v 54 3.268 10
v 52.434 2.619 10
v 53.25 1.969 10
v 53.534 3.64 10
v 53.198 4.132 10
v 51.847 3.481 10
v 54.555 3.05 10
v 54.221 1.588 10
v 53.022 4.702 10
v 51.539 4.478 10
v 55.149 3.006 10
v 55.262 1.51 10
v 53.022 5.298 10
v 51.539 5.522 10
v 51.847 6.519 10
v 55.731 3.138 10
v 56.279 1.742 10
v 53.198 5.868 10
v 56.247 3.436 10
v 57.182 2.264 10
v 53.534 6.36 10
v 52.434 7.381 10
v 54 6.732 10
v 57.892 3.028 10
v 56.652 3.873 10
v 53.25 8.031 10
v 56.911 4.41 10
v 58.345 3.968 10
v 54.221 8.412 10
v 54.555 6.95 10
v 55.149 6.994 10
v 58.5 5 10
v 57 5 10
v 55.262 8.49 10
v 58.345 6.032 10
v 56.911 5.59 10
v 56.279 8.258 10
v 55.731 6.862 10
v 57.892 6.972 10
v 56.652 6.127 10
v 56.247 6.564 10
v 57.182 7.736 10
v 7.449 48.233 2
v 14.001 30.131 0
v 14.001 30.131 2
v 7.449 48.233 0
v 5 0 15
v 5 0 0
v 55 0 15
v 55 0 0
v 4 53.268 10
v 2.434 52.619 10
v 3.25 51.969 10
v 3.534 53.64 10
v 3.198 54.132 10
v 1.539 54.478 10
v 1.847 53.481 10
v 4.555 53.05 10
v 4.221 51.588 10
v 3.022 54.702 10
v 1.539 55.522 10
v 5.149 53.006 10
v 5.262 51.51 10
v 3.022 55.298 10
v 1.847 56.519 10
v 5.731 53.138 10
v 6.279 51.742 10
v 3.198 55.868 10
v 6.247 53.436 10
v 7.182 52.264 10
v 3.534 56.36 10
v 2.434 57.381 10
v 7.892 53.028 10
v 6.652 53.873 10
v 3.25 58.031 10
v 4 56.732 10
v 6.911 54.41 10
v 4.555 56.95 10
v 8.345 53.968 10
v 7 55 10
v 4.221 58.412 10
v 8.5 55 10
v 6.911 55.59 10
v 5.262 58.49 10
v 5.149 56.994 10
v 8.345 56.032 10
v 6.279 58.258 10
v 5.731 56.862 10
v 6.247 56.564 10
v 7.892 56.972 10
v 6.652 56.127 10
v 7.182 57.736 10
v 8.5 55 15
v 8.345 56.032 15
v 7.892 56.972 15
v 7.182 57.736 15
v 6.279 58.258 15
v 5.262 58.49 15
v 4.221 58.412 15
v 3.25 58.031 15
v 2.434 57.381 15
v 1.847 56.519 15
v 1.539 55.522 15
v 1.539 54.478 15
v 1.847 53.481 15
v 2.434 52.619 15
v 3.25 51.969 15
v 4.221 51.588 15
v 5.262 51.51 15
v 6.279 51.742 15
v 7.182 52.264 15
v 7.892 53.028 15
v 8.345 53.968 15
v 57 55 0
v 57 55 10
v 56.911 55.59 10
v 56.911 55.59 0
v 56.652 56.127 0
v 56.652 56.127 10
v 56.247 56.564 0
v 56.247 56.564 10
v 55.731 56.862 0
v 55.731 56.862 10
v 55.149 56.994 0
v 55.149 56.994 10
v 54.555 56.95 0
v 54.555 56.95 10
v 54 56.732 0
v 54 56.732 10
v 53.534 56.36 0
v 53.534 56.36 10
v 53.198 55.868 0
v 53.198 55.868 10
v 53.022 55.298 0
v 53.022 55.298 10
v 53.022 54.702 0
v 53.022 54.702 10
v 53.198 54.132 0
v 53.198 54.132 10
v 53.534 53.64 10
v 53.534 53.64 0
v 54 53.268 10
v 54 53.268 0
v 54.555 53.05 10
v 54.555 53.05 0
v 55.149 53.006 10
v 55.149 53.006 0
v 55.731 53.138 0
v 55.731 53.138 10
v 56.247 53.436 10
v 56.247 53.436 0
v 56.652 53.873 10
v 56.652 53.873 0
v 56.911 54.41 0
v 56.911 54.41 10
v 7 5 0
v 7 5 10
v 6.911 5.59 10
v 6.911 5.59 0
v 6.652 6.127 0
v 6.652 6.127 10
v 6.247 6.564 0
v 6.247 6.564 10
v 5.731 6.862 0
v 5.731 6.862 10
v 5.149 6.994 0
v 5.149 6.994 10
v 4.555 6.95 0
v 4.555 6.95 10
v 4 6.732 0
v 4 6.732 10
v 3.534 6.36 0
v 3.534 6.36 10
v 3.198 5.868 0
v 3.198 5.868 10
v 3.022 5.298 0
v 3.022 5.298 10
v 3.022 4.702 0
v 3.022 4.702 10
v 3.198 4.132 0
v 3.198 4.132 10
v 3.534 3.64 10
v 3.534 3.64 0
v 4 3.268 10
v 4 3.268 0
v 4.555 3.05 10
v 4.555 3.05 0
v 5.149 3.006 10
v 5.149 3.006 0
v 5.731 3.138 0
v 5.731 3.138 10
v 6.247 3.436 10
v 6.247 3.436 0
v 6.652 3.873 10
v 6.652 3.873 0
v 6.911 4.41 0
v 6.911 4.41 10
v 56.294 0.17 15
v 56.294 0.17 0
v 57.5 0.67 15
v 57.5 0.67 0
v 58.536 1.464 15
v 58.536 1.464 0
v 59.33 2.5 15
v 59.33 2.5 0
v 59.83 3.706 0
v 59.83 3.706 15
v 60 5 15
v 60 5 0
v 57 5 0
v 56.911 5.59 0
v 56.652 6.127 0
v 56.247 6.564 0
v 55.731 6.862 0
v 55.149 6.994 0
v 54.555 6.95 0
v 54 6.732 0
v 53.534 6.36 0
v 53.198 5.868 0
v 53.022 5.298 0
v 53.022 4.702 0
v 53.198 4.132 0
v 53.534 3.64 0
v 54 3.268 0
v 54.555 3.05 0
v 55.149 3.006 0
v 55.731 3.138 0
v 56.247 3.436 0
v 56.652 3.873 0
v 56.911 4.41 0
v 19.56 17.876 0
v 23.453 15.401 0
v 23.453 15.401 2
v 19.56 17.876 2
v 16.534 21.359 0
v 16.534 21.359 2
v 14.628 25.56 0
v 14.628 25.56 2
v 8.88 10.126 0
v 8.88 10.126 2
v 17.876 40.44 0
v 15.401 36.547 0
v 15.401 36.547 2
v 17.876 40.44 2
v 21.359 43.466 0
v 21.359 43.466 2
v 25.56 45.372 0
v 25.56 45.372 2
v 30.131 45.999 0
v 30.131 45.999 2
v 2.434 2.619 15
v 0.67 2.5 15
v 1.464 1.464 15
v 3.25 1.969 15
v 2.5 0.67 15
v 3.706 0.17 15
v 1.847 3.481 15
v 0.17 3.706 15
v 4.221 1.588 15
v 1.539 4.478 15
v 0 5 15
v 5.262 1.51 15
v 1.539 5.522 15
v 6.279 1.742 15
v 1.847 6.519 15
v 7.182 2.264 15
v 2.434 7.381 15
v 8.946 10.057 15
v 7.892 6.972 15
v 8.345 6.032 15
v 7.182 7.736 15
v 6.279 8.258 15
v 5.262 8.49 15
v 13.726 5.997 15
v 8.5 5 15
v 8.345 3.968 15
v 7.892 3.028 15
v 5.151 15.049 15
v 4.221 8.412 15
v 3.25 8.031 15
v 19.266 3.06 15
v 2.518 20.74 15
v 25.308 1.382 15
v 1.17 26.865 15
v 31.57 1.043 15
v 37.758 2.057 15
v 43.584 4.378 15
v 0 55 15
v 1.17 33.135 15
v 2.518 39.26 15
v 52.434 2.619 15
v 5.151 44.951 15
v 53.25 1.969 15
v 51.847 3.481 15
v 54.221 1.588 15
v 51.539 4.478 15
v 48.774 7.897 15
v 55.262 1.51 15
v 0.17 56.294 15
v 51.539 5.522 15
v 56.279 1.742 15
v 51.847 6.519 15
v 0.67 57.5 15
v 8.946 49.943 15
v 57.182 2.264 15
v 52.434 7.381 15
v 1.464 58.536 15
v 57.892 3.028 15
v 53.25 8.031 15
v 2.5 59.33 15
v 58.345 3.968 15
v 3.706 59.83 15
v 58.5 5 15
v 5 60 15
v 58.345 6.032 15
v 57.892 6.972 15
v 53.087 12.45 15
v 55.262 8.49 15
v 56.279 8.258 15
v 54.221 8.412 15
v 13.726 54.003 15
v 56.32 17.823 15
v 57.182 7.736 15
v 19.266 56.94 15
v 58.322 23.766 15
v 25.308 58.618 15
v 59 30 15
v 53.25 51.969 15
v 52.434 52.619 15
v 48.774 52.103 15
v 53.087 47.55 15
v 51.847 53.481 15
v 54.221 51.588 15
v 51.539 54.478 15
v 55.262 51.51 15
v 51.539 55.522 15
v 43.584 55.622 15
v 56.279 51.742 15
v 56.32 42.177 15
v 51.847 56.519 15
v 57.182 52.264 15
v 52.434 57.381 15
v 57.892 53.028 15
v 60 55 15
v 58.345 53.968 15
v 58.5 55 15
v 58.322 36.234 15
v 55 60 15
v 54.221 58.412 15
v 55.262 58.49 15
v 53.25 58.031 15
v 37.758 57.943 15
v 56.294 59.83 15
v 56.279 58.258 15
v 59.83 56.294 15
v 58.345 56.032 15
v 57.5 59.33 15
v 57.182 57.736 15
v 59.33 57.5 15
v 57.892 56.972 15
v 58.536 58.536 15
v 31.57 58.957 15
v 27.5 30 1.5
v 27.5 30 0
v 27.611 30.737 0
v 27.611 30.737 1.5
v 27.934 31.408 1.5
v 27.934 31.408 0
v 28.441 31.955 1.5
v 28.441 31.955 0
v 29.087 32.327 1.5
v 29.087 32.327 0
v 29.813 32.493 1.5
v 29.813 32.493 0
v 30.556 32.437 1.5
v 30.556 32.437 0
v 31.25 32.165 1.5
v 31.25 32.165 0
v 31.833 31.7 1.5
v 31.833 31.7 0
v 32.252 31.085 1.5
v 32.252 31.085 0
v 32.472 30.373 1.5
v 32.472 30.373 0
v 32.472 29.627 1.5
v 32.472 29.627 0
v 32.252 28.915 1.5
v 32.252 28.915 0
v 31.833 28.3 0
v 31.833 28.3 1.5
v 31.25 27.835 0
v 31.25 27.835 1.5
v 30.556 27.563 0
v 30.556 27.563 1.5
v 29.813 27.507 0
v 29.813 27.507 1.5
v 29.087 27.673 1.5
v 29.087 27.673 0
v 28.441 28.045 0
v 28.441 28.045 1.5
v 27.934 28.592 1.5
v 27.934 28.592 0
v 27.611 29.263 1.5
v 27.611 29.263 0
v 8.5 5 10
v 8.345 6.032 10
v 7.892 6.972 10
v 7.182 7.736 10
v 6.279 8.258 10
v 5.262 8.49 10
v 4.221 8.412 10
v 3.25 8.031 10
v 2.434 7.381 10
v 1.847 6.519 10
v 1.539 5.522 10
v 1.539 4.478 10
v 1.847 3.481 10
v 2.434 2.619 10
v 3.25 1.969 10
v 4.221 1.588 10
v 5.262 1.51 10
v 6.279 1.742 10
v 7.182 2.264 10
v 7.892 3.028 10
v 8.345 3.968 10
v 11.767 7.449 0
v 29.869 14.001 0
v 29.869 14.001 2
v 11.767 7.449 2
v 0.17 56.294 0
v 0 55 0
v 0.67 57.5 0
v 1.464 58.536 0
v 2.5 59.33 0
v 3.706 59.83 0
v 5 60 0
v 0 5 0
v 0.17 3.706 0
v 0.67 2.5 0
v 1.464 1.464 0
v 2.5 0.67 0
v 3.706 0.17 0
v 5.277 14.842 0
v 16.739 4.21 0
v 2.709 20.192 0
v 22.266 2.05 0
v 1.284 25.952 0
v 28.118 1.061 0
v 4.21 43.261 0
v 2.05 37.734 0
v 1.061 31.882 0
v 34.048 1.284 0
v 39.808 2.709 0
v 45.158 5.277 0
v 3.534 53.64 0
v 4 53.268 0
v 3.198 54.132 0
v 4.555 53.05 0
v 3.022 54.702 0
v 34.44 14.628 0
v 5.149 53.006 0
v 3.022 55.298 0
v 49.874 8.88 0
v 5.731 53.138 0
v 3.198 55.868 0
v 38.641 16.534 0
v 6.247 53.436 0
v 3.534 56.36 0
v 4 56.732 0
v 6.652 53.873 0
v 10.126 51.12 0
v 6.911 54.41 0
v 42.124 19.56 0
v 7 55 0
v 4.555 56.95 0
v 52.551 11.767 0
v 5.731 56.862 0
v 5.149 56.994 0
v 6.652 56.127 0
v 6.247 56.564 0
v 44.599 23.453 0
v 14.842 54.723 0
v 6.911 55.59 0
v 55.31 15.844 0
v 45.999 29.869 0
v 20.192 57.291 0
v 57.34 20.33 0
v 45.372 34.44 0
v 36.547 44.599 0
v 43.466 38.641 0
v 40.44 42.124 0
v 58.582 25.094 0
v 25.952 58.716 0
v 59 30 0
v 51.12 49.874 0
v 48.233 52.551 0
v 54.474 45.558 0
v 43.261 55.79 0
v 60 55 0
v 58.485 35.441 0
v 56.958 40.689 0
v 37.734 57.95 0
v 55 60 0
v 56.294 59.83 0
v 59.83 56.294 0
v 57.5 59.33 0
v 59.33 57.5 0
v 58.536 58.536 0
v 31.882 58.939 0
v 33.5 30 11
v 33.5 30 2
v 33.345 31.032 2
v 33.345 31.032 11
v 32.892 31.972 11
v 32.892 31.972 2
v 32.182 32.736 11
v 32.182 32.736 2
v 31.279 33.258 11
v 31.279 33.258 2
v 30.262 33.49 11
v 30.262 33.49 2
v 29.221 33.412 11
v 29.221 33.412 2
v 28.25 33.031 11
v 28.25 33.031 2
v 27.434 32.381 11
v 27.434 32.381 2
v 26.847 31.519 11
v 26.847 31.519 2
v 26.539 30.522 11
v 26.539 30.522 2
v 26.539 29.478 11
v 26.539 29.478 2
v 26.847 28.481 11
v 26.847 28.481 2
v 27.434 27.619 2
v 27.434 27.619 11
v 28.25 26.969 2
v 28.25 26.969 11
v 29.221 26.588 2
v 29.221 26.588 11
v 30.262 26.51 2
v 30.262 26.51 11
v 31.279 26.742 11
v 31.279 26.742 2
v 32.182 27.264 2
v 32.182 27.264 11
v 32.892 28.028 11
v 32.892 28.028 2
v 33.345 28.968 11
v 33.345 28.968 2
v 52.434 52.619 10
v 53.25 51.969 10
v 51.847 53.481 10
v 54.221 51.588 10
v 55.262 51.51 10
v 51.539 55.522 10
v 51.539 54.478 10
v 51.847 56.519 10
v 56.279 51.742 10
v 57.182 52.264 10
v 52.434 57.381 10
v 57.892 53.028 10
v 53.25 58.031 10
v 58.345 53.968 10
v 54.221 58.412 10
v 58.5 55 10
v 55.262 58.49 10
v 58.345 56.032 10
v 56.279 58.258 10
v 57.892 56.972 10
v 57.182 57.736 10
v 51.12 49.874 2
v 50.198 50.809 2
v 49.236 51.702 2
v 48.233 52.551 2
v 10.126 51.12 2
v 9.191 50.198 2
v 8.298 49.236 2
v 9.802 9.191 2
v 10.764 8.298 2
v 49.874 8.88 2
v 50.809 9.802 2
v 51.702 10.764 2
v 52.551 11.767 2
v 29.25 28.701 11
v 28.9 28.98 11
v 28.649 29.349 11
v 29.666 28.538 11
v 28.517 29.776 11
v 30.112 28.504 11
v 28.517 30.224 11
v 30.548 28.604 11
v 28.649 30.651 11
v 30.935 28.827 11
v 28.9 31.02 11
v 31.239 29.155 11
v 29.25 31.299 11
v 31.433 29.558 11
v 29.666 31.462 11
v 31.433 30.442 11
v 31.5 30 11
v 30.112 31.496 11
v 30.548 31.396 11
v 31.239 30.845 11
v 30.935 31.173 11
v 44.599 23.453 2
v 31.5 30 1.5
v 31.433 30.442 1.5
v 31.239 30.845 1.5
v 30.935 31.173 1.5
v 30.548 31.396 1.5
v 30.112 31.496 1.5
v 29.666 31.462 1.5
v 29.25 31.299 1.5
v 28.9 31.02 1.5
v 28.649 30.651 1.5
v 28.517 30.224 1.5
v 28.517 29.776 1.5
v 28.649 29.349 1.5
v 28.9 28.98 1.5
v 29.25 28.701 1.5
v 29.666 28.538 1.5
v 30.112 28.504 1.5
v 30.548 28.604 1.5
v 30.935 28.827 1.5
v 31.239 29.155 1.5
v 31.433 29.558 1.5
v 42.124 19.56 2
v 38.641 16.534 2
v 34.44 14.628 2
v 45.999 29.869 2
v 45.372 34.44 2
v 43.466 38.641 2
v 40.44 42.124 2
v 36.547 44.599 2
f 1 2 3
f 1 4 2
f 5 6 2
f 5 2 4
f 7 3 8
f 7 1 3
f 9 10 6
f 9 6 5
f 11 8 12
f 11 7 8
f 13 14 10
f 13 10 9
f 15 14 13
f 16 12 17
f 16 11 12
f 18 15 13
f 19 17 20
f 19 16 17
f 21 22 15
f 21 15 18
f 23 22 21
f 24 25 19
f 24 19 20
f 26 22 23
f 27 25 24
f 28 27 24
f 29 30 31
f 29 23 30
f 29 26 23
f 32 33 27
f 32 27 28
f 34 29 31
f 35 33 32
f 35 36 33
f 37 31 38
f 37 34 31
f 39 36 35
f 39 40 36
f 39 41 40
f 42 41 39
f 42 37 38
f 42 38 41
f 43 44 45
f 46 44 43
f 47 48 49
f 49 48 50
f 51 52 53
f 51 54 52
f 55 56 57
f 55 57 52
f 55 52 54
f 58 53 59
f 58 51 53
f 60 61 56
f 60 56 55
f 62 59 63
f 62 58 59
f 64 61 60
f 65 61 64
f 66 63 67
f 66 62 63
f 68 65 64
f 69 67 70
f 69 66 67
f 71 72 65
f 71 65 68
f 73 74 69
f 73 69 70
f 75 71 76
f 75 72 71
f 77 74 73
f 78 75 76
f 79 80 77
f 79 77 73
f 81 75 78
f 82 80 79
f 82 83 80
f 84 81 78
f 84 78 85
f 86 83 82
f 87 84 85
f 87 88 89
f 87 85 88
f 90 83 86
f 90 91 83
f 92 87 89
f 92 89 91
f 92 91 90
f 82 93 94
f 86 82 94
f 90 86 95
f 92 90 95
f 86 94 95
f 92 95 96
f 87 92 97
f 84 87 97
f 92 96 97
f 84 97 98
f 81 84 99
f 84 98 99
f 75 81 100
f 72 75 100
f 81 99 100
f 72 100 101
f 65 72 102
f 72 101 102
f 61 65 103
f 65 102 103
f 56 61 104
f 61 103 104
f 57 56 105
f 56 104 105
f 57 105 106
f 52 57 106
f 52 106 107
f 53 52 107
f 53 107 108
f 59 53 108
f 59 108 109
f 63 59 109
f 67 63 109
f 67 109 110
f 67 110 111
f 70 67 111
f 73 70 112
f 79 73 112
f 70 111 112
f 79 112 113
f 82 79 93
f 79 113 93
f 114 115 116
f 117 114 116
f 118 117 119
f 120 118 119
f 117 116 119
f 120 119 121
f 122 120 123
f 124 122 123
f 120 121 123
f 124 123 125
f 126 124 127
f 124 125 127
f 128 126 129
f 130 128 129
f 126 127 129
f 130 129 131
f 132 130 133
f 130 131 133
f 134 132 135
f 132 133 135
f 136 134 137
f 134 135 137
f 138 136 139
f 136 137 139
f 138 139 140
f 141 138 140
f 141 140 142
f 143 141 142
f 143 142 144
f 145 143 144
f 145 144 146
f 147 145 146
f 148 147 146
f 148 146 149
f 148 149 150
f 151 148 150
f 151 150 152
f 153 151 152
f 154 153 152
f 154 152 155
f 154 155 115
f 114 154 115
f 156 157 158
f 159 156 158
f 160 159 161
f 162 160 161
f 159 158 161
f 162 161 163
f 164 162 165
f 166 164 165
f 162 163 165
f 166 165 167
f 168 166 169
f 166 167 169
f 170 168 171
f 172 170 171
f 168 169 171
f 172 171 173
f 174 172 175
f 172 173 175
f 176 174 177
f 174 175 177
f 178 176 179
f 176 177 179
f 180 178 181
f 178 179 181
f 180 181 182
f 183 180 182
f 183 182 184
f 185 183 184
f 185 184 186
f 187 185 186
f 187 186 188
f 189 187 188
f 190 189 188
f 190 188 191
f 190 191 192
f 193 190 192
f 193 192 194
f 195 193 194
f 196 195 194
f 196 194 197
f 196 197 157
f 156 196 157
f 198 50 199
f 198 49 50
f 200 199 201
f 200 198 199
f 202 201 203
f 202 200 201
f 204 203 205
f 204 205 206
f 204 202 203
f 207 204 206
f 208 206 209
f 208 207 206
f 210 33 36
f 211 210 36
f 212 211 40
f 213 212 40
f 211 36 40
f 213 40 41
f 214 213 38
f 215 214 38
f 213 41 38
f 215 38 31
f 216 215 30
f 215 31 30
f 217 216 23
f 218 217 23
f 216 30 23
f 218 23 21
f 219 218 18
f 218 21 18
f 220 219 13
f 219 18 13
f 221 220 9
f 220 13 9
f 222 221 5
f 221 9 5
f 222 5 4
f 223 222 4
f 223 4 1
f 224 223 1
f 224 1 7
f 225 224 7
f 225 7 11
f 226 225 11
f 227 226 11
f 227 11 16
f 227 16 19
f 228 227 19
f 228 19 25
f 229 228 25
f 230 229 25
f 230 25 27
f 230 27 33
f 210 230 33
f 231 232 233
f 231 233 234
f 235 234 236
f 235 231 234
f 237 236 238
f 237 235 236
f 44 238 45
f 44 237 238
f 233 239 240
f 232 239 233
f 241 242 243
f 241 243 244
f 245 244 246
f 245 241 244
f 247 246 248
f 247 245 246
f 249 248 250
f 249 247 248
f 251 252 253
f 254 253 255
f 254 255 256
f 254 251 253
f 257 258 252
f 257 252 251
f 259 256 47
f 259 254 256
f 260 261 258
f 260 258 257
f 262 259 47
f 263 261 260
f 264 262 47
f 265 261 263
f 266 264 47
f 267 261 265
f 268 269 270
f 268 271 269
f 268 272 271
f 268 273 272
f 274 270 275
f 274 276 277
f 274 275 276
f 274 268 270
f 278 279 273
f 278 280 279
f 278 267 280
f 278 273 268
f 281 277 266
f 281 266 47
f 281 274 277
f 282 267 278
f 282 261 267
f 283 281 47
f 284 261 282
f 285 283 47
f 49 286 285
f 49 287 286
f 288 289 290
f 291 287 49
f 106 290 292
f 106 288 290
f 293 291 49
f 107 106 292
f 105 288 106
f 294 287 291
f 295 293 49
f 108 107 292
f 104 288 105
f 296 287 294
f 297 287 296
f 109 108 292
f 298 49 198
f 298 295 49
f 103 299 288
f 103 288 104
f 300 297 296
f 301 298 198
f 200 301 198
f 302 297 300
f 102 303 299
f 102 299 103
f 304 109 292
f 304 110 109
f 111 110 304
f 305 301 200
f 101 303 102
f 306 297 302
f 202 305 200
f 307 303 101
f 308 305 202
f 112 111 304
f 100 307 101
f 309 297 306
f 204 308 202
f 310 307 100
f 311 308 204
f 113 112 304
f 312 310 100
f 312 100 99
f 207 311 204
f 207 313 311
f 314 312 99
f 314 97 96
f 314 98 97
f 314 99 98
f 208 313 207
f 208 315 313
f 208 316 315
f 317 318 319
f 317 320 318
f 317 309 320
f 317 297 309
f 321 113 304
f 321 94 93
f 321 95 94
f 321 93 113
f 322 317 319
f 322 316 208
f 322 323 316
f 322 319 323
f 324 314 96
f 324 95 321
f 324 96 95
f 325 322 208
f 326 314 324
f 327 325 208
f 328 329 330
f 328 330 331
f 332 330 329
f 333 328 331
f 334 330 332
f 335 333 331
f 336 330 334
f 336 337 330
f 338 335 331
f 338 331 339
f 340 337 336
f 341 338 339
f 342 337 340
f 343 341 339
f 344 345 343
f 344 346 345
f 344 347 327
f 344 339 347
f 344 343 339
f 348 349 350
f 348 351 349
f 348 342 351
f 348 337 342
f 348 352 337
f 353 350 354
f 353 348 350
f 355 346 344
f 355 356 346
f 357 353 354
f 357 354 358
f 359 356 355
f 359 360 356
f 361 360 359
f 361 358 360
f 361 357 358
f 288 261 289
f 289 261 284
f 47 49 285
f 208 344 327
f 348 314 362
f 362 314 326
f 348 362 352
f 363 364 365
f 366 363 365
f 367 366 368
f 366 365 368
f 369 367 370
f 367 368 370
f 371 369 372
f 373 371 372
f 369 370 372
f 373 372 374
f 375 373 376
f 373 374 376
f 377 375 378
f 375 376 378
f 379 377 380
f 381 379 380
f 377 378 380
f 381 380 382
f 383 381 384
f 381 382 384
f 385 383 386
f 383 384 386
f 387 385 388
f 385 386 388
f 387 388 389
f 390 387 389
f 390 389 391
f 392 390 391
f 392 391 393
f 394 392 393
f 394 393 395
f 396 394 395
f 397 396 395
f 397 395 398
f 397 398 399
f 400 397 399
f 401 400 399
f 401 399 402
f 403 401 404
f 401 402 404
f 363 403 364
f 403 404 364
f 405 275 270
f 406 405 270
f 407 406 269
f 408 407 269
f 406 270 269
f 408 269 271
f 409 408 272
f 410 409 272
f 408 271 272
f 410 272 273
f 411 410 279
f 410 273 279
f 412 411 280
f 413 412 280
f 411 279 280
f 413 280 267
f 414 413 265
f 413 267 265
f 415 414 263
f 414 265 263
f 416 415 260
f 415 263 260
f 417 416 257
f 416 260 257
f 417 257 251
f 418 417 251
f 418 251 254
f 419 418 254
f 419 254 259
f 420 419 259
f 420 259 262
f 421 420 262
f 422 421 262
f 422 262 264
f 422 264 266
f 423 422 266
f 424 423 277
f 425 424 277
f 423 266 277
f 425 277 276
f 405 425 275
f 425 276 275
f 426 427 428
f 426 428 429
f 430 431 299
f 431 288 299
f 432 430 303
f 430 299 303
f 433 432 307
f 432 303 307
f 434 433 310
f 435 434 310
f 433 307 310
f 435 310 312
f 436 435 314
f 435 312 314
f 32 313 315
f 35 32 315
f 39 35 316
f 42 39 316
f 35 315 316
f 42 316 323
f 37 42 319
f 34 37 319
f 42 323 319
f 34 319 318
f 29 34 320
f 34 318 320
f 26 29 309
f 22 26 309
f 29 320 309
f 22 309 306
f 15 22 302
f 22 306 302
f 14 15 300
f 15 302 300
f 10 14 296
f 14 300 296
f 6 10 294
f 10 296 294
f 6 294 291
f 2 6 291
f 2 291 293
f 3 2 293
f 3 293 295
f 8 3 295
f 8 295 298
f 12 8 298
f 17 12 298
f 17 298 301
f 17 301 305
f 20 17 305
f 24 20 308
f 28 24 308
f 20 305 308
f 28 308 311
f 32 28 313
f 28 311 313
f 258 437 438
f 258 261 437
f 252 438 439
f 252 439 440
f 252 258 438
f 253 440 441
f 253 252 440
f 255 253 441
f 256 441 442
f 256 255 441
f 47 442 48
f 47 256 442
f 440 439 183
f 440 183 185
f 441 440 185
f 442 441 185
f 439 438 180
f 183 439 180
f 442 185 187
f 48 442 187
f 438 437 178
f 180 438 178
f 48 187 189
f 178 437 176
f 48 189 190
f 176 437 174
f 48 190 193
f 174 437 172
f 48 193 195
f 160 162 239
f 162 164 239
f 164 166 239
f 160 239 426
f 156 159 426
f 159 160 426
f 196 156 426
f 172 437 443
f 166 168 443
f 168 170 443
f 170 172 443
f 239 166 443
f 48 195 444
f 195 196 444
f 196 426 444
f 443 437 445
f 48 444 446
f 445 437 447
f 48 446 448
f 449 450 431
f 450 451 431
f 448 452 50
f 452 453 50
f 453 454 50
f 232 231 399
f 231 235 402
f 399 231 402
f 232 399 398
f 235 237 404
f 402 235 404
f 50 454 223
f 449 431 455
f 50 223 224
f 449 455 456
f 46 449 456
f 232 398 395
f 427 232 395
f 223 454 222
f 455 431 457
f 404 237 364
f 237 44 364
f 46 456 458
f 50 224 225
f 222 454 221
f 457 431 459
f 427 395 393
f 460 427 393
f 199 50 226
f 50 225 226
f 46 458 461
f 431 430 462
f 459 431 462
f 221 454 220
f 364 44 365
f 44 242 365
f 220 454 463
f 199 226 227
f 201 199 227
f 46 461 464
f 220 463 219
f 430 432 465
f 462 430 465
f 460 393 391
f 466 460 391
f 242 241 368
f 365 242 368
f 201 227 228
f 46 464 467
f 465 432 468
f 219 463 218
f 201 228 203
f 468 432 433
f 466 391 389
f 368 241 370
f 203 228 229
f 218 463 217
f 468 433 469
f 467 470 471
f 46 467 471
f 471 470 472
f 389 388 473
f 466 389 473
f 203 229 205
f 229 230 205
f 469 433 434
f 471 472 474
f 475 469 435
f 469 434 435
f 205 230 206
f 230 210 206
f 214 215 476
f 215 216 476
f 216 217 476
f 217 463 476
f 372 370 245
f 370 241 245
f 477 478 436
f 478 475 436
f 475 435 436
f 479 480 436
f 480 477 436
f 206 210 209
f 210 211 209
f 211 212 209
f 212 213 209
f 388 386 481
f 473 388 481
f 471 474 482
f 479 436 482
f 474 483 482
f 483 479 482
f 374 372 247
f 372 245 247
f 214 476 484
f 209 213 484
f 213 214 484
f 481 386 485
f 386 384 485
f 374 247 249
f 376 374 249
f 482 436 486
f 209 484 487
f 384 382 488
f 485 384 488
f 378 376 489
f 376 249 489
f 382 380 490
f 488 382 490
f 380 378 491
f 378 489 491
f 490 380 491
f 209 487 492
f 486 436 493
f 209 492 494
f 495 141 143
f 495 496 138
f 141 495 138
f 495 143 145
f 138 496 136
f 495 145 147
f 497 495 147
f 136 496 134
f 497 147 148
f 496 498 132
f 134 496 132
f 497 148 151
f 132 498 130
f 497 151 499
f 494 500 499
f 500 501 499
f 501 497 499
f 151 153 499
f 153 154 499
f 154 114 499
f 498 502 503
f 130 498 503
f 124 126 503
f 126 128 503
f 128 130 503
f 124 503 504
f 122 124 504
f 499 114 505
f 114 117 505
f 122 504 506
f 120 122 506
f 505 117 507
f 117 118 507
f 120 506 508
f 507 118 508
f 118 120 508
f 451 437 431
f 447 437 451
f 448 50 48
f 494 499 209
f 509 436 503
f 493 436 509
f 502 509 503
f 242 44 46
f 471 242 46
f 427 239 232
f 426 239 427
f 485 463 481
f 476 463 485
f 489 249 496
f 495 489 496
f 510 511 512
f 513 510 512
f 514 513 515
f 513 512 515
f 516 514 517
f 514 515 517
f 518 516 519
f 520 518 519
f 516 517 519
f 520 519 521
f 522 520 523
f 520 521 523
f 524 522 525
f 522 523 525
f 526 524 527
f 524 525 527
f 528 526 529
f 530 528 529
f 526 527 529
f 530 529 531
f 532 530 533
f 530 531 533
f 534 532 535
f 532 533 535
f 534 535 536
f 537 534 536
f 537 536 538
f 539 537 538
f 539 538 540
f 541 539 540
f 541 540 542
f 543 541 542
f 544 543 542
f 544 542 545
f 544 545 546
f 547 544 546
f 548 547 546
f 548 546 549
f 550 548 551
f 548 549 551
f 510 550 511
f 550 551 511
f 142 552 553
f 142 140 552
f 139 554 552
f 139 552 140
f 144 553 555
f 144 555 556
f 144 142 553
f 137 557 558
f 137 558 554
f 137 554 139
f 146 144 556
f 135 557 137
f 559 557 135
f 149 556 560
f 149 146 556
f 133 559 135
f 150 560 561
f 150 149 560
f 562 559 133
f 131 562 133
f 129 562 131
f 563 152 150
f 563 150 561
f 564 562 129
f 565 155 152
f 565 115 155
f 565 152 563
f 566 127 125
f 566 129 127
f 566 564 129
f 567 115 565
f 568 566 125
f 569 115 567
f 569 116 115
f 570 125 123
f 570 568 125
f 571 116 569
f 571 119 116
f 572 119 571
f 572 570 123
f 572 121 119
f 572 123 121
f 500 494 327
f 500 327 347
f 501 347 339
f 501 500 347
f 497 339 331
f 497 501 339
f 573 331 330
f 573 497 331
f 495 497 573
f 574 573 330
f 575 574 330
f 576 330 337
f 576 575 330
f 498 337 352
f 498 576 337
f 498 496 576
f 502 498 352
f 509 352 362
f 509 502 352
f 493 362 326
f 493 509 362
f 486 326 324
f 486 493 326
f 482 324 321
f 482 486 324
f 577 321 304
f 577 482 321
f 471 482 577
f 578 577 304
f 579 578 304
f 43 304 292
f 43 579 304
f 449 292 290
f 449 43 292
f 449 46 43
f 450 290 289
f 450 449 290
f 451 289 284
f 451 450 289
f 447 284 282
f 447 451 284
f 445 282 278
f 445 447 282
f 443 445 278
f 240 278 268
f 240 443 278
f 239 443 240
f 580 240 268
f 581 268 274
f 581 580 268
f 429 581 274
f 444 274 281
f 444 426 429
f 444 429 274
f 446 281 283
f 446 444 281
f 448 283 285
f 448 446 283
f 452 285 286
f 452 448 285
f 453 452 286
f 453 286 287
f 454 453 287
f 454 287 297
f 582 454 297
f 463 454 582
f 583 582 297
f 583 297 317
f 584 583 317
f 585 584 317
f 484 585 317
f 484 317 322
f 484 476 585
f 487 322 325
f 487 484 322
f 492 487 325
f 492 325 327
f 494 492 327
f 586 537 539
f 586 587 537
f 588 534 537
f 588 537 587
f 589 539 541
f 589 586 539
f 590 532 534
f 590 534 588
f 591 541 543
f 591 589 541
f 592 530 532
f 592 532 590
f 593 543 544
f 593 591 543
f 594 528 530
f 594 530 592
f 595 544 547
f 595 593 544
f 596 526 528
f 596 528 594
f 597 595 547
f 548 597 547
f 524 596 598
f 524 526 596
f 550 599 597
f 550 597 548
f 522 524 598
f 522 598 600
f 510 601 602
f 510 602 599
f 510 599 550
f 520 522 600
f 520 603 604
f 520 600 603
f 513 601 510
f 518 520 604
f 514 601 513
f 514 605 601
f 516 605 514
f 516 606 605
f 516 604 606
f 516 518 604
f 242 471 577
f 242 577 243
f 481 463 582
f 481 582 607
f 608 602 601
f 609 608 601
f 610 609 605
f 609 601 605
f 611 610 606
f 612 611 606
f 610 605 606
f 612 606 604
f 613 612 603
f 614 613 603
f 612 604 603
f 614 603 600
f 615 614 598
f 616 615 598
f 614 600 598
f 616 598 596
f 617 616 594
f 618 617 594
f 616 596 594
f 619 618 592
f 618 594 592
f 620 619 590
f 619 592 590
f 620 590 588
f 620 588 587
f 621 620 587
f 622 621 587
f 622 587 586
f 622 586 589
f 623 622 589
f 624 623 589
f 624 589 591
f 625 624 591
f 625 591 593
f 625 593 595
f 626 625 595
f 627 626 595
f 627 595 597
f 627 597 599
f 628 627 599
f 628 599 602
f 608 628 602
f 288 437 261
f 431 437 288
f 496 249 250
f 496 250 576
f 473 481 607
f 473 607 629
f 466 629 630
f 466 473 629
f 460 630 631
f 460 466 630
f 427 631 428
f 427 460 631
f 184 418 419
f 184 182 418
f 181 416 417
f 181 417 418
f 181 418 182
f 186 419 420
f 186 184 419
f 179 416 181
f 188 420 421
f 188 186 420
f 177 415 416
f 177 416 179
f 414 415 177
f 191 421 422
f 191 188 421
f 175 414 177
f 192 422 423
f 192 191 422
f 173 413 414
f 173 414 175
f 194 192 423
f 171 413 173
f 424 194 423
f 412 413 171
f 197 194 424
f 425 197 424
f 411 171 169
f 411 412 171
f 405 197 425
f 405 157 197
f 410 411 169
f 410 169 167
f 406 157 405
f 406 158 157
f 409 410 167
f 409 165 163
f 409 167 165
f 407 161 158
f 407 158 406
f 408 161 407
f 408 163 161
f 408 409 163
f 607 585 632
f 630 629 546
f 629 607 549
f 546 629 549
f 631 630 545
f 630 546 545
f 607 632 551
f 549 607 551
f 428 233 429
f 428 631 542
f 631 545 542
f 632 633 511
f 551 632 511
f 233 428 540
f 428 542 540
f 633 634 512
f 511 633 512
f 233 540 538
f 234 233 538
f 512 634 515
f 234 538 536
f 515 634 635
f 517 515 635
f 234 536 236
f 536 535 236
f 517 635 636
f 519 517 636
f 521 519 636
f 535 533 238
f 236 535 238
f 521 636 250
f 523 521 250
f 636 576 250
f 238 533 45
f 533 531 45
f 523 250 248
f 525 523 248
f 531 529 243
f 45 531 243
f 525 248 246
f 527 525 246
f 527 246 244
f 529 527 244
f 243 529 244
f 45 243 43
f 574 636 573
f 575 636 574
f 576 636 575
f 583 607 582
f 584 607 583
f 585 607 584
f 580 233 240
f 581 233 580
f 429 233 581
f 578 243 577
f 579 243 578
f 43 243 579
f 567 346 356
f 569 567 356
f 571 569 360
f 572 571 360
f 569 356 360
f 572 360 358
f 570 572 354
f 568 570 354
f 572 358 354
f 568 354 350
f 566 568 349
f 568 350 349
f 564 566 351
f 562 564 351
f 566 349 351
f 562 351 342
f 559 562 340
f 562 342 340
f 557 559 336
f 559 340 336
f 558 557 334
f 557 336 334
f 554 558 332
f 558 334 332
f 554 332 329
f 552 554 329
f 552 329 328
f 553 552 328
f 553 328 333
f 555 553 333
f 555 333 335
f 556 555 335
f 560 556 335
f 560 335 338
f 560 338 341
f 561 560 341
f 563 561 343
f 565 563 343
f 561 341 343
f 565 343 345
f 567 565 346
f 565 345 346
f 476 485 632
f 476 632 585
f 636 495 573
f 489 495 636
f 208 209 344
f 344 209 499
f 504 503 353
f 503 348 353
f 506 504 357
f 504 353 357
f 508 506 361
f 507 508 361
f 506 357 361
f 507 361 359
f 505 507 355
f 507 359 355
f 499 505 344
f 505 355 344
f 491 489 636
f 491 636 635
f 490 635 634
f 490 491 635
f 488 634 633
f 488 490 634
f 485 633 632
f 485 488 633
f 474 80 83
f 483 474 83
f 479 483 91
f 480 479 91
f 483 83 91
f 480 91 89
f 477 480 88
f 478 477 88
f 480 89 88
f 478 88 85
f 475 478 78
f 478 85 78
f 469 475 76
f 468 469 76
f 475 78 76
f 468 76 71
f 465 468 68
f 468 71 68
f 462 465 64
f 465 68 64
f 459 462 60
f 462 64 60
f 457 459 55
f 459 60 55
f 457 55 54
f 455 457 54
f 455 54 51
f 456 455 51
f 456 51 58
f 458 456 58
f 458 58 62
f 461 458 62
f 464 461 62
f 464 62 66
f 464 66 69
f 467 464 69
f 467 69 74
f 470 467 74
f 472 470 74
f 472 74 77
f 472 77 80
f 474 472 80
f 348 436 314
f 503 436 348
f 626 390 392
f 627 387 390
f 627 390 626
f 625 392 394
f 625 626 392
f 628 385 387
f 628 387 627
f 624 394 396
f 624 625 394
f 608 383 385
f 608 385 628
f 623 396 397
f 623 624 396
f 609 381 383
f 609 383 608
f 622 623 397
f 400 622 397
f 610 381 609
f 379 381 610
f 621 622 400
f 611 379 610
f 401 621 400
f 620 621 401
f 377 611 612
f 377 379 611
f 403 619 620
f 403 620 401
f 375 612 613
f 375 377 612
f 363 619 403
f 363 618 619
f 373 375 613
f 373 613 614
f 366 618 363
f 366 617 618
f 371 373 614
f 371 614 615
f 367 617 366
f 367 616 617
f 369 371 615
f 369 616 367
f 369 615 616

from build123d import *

# Parameters (mm, degrees)
ESBO_O1_W                = 60
ESBO_O1_H                = 60
ESBO_O1_R                = 29
RESSALTO_EXTRUS_O1_DEPTH = 15
ESBO_O2_R                = 2
CORTE_EXTRUS_O1_DEPTH    = 15
ESBO_O3_R                = 3.5
CORTE_EXTRUS_O2_DEPTH    = 5
FILETE1_R                = 5
RESSALTO_EXTRUS_O2_DEPTH = 2
ESBO_O5_R                = 3.5
RESSALTO_EXTRUS_O3_DEPTH = 9
ESBO_O6_R                = 1.5
CORTE_EXTRUS_O3_DEPTH    = 18.3
ESBO_O7_R                = 2.5
CORTE_EXTRUS_O4_DEPTH    = 1.5


with BuildPart() as part:
    # Esboço1 → Ressalto-extrusão1 (new body)
    with BuildSketch(Plane.XY):
        with Locations((30, 30)):
            Rectangle(ESBO_O1_W, ESBO_O1_H)
        with Locations((30, 30)):
            Circle(ESBO_O1_R, mode=Mode.SUBTRACT)
    extrude(amount=RESSALTO_EXTRUS_O1_DEPTH)

    # Esboço2 → Corte-extrusão1 (cut)
    with BuildSketch(Plane.XY.offset(15)):
        with Locations((5, 55)):
            Circle(ESBO_O2_R)
        with Locations((55, 55)):
            Circle(ESBO_O2_R)
        with Locations((55, 5)):
            Circle(ESBO_O2_R)
        with Locations((5, 5)):
            Circle(ESBO_O2_R)
    extrude(amount=-CORTE_EXTRUS_O1_DEPTH, mode=Mode.SUBTRACT)

    # Esboço3 → Corte-extrusão2 (cut)
    with BuildSketch(Plane.XY.offset(15)):
        with Locations((5, 55)):
            Circle(ESBO_O3_R)
        with Locations((55, 55)):
            Circle(ESBO_O3_R)
        with Locations((55, 5)):
            Circle(ESBO_O3_R)
        with Locations((5, 5)):
            Circle(ESBO_O3_R)
    extrude(amount=-CORTE_EXTRUS_O2_DEPTH, mode=Mode.SUBTRACT)

    # Filete1
    filete1_edges = [part.edges().sort_by_distance(p)[0] for p in [
        (0, 60, 7.5),
        (60, 60, 7.5),
        (60, 0, 7.5),
        (0, 0, 7.5),
    ]]
    fillet(filete1_edges, radius=FILETE1_R)

    # Esboço4 → Ressalto-extrusão2 (add)
    with BuildSketch(Plane(origin=(0, 0, 0), x_dir=(-1, 0, 0), z_dir=(0, 0, -1))):
        with BuildLine():
            Line((-30.130751647, 45.999465741), (-48.233254252, 52.551018589))
            ThreePointArc((-48.233254252, 52.551018589), (-49.721988735, 51.261306647), (-51.119742067, 49.873512398))
            Line((-51.119742067, 49.873512398), (-36.546722488, 44.599329596))
            ThreePointArc((-36.546722488, 44.599329596), (-43.465751902, 38.641384479), (-45.999465741, 29.869248353))
            Line((-45.999465741, 29.869248353), (-52.551018589, 11.766745748))
            ThreePointArc((-52.551018589, 11.766745748), (-51.261306647, 10.278011265), (-49.873512398, 8.880257933))
            Line((-49.873512398, 8.880257933), (-44.599329596, 23.453277512))
            ThreePointArc((-44.599329596, 23.453277512), (-38.641384479, 16.534248098), (-29.869248353, 14.000534259))
            Line((-29.869248353, 14.000534259), (-11.766745748, 7.448981411))
            ThreePointArc((-11.766745748, 7.448981411), (-10.278011265, 8.738693353), (-8.880257933, 10.126487602))
            Line((-8.880257933, 10.126487602), (-23.453277512, 15.400670404))
            ThreePointArc((-23.453277512, 15.400670404), (-16.534248098, 21.358615521), (-14.000534259, 30.130751647))
            Line((-14.000534259, 30.130751647), (-7.448981411, 48.233254252))
            ThreePointArc((-7.448981411, 48.233254252), (-8.738693353, 49.721988735), (-10.126487602, 51.119742067))
            Line((-10.126487602, 51.119742067), (-15.400670404, 36.546722488))
            ThreePointArc((-15.400670404, 36.546722488), (-21.358615521, 43.465751902), (-30.130751647, 45.999465741))
        make_face()
    extrude(amount=-RESSALTO_EXTRUS_O2_DEPTH)

    # Esboço5 → Ressalto-extrusão3 (add)
    with BuildSketch(Plane.XY.offset(2)):
        with Locations((30, 30)):
            Circle(ESBO_O5_R)
    extrude(amount=RESSALTO_EXTRUS_O3_DEPTH)

    # Esboço6 → Corte-extrusão3 (cut)
    with BuildSketch(Plane.XY.offset(11)):
        with Locations((30, 30)):
            Circle(ESBO_O6_R)
    extrude(amount=-CORTE_EXTRUS_O3_DEPTH, mode=Mode.SUBTRACT)

    # Esboço7 → Corte-extrusão4 (cut)
    with BuildSketch(Plane(origin=(0, 0, 0), x_dir=(-1, 0, 0), z_dir=(0, 0, -1))):
        with Locations((-30, 30)):
            Circle(ESBO_O7_R)
    extrude(amount=-CORTE_EXTRUS_O4_DEPTH, mode=Mode.SUBTRACT)


solid = part.part
